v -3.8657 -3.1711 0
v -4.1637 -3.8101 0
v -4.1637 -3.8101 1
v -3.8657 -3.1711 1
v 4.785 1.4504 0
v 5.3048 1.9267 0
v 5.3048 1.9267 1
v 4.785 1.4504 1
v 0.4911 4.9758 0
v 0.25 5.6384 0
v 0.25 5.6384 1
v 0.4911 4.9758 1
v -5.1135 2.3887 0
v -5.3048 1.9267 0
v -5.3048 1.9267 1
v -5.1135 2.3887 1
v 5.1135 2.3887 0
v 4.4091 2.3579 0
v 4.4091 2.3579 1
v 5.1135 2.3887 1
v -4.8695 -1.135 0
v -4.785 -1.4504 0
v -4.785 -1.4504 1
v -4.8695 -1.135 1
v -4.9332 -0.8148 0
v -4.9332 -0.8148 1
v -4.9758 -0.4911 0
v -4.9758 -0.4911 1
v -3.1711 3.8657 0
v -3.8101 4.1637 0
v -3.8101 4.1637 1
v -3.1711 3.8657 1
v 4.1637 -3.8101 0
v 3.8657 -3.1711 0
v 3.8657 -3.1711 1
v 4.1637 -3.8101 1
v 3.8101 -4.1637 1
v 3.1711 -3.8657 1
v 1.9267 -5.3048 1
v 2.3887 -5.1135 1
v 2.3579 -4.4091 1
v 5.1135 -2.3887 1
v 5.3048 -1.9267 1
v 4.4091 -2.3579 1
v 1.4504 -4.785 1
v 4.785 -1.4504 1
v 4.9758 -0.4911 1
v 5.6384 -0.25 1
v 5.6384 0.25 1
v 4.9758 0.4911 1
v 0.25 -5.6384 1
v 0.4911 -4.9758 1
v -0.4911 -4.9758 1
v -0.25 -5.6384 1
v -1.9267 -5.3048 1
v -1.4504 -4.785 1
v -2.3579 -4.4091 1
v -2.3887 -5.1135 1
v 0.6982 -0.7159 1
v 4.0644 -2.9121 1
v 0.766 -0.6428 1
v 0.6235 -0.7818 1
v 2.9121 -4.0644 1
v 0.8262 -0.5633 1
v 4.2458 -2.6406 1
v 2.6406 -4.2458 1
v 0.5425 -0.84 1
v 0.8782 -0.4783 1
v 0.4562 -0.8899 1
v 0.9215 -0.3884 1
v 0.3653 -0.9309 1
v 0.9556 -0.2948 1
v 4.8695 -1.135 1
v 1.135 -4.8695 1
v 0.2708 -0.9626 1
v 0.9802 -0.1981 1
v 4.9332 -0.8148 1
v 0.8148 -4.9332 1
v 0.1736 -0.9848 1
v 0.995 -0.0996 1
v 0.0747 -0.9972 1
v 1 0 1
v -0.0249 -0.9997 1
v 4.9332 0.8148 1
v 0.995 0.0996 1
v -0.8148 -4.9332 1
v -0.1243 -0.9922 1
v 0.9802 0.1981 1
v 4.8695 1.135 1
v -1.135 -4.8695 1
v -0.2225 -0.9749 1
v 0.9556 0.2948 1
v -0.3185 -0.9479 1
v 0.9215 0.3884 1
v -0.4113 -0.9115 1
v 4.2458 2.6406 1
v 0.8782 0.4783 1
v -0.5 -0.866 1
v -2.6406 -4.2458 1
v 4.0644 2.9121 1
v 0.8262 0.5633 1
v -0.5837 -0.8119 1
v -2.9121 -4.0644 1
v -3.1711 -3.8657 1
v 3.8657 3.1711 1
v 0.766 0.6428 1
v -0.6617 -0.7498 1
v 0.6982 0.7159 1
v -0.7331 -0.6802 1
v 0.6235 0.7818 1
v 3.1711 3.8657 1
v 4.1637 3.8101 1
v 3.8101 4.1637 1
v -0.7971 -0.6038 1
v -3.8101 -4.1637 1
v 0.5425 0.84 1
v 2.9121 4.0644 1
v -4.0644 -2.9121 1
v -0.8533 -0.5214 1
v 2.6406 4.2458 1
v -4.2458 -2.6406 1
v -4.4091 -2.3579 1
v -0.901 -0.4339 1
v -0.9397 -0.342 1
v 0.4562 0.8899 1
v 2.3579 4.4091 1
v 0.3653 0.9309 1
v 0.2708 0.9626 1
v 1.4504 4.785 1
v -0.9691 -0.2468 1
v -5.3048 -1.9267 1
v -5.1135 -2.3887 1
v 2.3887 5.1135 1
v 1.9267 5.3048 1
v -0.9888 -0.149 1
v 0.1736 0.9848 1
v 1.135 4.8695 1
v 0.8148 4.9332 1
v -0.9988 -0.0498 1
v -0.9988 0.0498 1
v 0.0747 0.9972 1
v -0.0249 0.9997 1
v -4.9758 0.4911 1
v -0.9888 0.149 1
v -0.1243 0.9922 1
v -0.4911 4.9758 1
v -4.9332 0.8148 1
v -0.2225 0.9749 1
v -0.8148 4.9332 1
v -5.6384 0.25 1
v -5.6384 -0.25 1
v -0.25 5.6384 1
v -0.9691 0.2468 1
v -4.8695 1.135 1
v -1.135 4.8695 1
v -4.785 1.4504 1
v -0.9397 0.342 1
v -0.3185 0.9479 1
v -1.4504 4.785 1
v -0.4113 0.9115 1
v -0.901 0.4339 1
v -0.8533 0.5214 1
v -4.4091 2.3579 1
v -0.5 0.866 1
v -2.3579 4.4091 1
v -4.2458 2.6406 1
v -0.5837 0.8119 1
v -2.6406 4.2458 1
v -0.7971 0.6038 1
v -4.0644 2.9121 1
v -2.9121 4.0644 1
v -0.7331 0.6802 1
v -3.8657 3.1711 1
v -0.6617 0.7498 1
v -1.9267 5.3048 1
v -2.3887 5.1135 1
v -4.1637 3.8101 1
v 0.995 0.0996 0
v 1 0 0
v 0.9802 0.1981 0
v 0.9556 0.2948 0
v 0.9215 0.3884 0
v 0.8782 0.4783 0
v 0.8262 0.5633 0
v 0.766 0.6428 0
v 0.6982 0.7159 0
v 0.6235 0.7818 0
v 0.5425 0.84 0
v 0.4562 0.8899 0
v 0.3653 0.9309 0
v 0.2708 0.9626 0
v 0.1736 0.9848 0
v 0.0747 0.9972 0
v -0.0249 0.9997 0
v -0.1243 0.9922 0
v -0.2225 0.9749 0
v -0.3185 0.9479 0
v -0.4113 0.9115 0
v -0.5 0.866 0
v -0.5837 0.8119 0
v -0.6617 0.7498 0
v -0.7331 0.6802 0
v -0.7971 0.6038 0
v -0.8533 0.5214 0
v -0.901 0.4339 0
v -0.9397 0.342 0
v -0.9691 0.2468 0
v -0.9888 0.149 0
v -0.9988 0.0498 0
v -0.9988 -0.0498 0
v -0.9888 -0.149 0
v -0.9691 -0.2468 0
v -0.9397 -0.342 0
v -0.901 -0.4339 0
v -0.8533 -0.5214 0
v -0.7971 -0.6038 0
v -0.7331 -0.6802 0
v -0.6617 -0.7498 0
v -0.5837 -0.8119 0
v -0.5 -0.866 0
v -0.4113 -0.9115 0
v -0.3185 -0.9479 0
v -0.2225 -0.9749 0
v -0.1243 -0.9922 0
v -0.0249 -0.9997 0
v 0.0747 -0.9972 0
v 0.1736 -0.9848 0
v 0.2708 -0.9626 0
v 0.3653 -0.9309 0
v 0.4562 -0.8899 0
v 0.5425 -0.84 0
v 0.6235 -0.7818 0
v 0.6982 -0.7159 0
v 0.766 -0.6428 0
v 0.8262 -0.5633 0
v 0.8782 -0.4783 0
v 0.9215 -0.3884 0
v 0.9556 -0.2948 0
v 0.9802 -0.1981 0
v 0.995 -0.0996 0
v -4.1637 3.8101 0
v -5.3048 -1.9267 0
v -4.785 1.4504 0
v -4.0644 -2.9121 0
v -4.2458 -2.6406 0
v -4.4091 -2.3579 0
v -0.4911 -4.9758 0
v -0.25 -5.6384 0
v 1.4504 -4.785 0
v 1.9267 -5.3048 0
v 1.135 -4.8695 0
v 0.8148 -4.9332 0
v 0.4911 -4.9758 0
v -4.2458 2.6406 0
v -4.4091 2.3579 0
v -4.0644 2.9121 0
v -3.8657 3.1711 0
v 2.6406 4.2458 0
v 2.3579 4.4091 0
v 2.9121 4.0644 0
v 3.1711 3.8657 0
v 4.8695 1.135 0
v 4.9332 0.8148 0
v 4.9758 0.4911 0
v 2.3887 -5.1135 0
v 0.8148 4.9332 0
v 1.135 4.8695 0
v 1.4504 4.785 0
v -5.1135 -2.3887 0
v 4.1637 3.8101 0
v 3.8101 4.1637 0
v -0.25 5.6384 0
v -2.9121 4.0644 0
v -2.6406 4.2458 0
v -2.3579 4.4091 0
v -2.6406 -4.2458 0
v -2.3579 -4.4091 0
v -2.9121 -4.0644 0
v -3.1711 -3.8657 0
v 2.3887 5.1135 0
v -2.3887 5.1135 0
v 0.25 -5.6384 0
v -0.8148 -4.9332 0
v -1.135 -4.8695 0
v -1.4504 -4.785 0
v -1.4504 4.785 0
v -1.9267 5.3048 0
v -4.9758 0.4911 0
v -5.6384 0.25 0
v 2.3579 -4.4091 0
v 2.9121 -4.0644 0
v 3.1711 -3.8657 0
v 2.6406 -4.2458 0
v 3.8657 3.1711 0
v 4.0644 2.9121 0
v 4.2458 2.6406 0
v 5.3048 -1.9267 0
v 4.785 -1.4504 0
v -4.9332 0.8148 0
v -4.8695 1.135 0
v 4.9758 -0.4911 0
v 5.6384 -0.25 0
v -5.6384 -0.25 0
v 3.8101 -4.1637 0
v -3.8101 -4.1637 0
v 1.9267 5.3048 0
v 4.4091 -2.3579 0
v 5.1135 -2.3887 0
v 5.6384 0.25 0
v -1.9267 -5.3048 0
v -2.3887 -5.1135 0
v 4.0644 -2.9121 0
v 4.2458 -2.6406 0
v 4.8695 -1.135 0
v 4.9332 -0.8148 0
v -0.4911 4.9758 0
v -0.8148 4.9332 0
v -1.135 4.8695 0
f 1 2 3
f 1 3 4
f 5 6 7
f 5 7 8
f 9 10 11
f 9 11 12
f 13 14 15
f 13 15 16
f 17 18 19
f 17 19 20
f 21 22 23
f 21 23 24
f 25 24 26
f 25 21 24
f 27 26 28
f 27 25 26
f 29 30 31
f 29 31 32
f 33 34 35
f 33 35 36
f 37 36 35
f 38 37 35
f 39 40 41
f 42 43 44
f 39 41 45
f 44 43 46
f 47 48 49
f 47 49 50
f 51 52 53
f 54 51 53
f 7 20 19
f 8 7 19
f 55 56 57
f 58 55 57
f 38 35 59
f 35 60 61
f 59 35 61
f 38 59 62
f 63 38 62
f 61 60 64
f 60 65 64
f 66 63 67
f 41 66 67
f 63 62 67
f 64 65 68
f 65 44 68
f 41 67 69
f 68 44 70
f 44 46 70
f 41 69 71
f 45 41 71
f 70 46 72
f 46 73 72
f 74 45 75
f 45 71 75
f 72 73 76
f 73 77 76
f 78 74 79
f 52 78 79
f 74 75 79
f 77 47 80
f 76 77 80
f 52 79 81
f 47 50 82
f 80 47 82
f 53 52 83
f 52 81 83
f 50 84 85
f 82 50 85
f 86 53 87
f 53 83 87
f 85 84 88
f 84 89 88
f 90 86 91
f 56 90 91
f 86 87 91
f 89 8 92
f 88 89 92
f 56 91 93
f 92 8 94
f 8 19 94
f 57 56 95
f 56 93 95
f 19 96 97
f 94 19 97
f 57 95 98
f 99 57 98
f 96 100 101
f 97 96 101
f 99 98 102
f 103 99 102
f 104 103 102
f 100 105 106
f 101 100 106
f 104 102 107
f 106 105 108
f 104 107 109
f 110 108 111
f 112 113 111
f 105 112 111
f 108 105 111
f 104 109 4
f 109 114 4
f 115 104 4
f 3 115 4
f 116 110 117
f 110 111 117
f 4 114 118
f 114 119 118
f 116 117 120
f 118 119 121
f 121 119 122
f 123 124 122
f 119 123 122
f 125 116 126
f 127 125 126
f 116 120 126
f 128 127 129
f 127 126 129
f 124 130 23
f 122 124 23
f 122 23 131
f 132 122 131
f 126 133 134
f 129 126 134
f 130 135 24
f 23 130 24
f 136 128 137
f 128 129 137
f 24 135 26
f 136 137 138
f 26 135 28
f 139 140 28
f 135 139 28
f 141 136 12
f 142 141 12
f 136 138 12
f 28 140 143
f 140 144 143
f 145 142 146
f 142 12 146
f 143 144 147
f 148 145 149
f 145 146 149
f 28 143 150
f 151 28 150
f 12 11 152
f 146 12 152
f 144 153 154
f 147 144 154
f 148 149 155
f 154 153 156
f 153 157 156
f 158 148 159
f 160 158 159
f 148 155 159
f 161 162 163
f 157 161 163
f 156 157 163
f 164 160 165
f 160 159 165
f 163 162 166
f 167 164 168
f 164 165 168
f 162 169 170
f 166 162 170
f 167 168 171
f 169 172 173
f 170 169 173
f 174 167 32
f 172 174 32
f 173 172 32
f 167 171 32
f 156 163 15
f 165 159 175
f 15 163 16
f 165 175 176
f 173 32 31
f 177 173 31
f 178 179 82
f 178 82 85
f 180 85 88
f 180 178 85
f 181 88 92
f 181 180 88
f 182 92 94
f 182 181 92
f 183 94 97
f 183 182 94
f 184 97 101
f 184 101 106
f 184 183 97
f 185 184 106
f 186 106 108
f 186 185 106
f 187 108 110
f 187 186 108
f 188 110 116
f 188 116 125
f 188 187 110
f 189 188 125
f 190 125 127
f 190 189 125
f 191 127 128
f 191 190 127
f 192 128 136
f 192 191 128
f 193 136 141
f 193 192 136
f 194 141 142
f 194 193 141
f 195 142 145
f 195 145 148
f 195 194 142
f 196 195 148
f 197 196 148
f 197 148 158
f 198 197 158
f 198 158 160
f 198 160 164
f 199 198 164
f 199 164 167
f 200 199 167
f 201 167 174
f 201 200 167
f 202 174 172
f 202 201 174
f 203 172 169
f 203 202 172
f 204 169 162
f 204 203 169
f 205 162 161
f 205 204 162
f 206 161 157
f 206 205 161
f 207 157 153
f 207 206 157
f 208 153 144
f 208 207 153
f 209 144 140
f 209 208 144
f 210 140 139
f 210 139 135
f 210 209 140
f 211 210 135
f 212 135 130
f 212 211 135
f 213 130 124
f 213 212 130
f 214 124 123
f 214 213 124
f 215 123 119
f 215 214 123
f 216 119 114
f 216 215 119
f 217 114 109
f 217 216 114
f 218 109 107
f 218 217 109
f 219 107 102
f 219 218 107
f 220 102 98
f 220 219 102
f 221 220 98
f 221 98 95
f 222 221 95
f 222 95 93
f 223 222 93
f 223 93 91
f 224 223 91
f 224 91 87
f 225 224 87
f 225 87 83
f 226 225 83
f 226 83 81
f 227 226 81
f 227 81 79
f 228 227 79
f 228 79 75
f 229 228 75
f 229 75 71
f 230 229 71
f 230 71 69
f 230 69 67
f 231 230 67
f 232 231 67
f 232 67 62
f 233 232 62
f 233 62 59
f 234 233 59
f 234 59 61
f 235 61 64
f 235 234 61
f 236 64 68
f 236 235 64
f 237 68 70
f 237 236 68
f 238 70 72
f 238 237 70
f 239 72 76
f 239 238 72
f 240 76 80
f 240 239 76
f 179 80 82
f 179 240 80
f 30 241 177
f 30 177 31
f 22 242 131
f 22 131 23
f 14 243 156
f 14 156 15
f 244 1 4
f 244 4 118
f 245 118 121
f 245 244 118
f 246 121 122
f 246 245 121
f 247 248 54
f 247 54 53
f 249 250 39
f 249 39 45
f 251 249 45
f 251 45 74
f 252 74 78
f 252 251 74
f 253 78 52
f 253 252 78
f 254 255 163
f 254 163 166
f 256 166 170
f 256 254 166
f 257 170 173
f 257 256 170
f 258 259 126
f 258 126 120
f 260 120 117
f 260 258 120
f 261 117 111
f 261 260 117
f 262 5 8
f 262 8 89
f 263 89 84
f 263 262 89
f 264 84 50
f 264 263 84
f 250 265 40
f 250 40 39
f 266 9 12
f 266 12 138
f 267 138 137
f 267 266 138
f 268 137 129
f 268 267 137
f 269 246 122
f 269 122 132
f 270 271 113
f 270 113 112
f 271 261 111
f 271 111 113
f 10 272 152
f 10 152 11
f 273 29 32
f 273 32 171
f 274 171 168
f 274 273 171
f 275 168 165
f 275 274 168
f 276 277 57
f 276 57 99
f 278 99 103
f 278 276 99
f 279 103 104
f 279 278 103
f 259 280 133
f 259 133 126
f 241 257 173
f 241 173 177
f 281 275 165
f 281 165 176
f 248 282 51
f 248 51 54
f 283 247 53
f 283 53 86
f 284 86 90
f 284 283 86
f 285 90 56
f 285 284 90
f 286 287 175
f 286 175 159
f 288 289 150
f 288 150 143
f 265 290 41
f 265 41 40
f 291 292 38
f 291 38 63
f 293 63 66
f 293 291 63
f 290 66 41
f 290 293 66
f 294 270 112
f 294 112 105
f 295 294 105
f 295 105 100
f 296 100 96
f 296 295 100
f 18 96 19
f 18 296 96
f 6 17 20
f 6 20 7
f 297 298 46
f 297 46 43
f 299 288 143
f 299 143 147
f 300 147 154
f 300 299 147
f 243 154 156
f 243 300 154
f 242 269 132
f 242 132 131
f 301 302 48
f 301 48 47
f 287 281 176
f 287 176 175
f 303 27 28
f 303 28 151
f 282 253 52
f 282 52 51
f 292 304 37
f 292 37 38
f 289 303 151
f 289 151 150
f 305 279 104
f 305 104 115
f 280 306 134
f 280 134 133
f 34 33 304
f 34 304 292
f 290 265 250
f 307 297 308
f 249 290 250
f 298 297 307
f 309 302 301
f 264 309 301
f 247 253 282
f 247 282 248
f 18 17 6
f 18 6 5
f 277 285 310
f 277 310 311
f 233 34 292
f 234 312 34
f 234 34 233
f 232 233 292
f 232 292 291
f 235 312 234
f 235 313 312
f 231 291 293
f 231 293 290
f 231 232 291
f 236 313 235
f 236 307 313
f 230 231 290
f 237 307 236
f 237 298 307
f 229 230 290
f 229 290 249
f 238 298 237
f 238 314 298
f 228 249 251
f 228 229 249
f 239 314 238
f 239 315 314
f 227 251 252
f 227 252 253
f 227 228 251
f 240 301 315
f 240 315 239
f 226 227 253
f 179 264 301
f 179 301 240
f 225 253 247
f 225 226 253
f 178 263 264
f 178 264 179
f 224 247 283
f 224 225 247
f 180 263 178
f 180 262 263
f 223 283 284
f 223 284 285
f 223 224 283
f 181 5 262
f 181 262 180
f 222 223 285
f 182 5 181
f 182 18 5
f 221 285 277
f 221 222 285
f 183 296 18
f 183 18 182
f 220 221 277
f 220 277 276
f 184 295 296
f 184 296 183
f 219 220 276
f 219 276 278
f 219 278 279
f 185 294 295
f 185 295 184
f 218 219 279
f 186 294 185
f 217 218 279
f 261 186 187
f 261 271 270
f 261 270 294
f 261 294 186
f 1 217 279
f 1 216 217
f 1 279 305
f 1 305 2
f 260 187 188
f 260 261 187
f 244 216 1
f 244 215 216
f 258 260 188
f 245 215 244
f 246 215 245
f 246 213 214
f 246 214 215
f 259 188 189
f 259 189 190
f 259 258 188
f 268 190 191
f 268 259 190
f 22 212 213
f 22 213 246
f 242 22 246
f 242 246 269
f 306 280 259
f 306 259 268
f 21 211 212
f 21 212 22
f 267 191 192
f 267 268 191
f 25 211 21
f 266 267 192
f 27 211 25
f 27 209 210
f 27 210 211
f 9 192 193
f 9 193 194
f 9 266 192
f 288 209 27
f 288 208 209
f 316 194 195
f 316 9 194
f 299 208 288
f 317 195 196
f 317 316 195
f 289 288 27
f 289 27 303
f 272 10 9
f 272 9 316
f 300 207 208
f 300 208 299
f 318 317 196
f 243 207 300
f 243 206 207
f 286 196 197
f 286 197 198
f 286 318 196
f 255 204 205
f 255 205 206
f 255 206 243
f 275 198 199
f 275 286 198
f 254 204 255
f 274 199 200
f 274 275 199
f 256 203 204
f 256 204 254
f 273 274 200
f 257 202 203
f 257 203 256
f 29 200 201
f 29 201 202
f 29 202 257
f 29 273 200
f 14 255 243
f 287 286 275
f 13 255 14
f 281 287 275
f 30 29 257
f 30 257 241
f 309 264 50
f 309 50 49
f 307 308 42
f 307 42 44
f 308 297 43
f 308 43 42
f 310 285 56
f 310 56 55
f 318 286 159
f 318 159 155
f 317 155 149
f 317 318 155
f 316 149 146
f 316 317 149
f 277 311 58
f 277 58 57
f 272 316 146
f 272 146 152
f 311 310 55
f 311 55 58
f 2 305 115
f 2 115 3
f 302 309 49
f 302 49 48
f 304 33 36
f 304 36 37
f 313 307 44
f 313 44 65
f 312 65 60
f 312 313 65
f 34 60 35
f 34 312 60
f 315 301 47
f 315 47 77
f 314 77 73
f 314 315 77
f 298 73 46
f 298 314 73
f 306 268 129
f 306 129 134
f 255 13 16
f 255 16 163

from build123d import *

# Parameters (mm, degrees)
SKETCH2_R           = 1
BOSS_EXTRUDE2_DEPTH = 1


with BuildPart() as part:
    # Sketch2 → Boss-Extrude2 (new body)
    with BuildSketch(Plane.XY):
        with BuildLine():
            Line((-0.25, 5.638363295), (0.25, 5.638363295))
            Line((0.25, 5.638363295), (0.491146384, 4.975819051))
            ThreePointArc((0.491146384, 4.975819051), (0.97545161, 4.903926402), (1.450403422, 4.785010963))
            Line((1.450403422, 4.785010963), (1.926738336, 5.304839303))
            Line((1.926738336, 5.304839303), (2.388678102, 5.113497587))
            Line((2.388678102, 5.113497587), (2.357923605, 4.409103795))
            ThreePointArc((2.357923605, 4.409103795), (2.777851165, 4.157348062), (3.171142455, 3.865728332))
            Line((3.171142455, 3.865728332), (3.810148226, 4.163701616))
            Line((3.810148226, 4.163701616), (4.163701616, 3.810148226))
            Line((4.163701616, 3.810148226), (3.865728332, 3.171142455))
            ThreePointArc((3.865728332, 3.171142455), (4.157348062, 2.777851165), (4.409103795, 2.357923605))
            Line((4.409103795, 2.357923605), (5.113497587, 2.388678102))
            Line((5.113497587, 2.388678102), (5.304839303, 1.926738336))
            Line((5.304839303, 1.926738336), (4.785010963, 1.450403422))
            ThreePointArc((4.785010963, 1.450403422), (4.903926402, 0.97545161), (4.975819051, 0.491146384))
            Line((4.975819051, 0.491146384), (5.638363295, 0.25))
            Line((5.638363295, 0.25), (5.638363295, -0.25))
            Line((5.638363295, -0.25), (4.975819051, -0.491146384))
            ThreePointArc((4.975819051, -0.491146384), (4.903926402, -0.97545161), (4.785010963, -1.450403422))
            Line((4.785010963, -1.450403422), (5.304839303, -1.926738336))
            Line((5.304839303, -1.926738336), (5.113497587, -2.388678102))
            Line((5.113497587, -2.388678102), (4.409103795, -2.357923605))
            ThreePointArc((4.409103795, -2.357923605), (4.157348062, -2.777851165), (3.865728332, -3.171142455))
            Line((3.865728332, -3.171142455), (4.163701616, -3.810148226))
            Line((4.163701616, -3.810148226), (3.810148226, -4.163701616))
            Line((3.810148226, -4.163701616), (3.171142455, -3.865728332))
            ThreePointArc((3.171142455, -3.865728332), (2.777851165, -4.157348062), (2.357923605, -4.409103795))
            Line((2.357923605, -4.409103795), (2.388678102, -5.113497587))
            Line((2.388678102, -5.113497587), (1.926738336, -5.304839303))
            Line((1.926738336, -5.304839303), (1.450403422, -4.785010963))
            ThreePointArc((1.450403422, -4.785010963), (0.97545161, -4.903926402), (0.491146384, -4.975819051))
            Line((0.491146384, -4.975819051), (0.25, -5.638363295))
            Line((0.25, -5.638363295), (-0.25, -5.638363295))
            Line((-0.25, -5.638363295), (-0.491146384, -4.975819051))
            ThreePointArc((-0.491146384, -4.975819051), (-0.97545161, -4.903926402), (-1.450403422, -4.785010963))
            Line((-1.450403422, -4.785010963), (-1.926738336, -5.304839303))
            Line((-1.926738336, -5.304839303), (-2.388678102, -5.113497587))
            Line((-2.388678102, -5.113497587), (-2.357923605, -4.409103795))
            ThreePointArc((-2.357923605, -4.409103795), (-2.777851165, -4.157348062), (-3.171142455, -3.865728332))
            Line((-3.171142455, -3.865728332), (-3.810148226, -4.163701616))
            Line((-3.810148226, -4.163701616), (-4.163701616, -3.810148226))
            Line((-4.163701616, -3.810148226), (-3.865728332, -3.171142455))
            ThreePointArc((-3.865728332, -3.171142455), (-4.157348062, -2.777851165), (-4.409103795, -2.357923605))
            Line((-4.409103795, -2.357923605), (-5.113497587, -2.388678102))
            Line((-5.113497587, -2.388678102), (-5.304839303, -1.926738336))
            Line((-5.304839303, -1.926738336), (-4.785010963, -1.450403422))
            ThreePointArc((-4.785010963, -1.450403422), (-4.903926402, -0.97545161), (-4.975819051, -0.491146384))
            Line((-4.975819051, -0.491146384), (-5.638363295, -0.25))
            Line((-5.638363295, -0.25), (-5.638363295, 0.25))
            Line((-5.638363295, 0.25), (-4.975819051, 0.491146384))
            ThreePointArc((-4.975819051, 0.491146384), (-4.903926402, 0.97545161), (-4.785010963, 1.450403422))
            Line((-4.785010963, 1.450403422), (-5.304839303, 1.926738336))
            Line((-5.304839303, 1.926738336), (-5.113497587, 2.388678102))
            Line((-5.113497587, 2.388678102), (-4.409103795, 2.357923605))
            ThreePointArc((-4.409103795, 2.357923605), (-4.157348062, 2.777851165), (-3.865728332, 3.171142455))
            Line((-3.865728332, 3.171142455), (-4.163701616, 3.810148226))
            Line((-4.163701616, 3.810148226), (-3.810148226, 4.163701616))
            Line((-3.810148226, 4.163701616), (-3.171142455, 3.865728332))
            ThreePointArc((-3.171142455, 3.865728332), (-2.777851165, 4.157348062), (-2.357923605, 4.409103795))
            Line((-2.357923605, 4.409103795), (-2.388678102, 5.113497587))
            Line((-2.388678102, 5.113497587), (-1.926738336, 5.304839303))
            Line((-1.926738336, 5.304839303), (-1.450403422, 4.785010963))
            ThreePointArc((-1.450403422, 4.785010963), (-0.97545161, 4.903926402), (-0.491146384, 4.975819051))
            Line((-0.491146384, 4.975819051), (-0.25, 5.638363295))
        make_face()
        Circle(SKETCH2_R, mode=Mode.SUBTRACT)
    extrude(amount=BOSS_EXTRUDE2_DEPTH)


solid = part.part
